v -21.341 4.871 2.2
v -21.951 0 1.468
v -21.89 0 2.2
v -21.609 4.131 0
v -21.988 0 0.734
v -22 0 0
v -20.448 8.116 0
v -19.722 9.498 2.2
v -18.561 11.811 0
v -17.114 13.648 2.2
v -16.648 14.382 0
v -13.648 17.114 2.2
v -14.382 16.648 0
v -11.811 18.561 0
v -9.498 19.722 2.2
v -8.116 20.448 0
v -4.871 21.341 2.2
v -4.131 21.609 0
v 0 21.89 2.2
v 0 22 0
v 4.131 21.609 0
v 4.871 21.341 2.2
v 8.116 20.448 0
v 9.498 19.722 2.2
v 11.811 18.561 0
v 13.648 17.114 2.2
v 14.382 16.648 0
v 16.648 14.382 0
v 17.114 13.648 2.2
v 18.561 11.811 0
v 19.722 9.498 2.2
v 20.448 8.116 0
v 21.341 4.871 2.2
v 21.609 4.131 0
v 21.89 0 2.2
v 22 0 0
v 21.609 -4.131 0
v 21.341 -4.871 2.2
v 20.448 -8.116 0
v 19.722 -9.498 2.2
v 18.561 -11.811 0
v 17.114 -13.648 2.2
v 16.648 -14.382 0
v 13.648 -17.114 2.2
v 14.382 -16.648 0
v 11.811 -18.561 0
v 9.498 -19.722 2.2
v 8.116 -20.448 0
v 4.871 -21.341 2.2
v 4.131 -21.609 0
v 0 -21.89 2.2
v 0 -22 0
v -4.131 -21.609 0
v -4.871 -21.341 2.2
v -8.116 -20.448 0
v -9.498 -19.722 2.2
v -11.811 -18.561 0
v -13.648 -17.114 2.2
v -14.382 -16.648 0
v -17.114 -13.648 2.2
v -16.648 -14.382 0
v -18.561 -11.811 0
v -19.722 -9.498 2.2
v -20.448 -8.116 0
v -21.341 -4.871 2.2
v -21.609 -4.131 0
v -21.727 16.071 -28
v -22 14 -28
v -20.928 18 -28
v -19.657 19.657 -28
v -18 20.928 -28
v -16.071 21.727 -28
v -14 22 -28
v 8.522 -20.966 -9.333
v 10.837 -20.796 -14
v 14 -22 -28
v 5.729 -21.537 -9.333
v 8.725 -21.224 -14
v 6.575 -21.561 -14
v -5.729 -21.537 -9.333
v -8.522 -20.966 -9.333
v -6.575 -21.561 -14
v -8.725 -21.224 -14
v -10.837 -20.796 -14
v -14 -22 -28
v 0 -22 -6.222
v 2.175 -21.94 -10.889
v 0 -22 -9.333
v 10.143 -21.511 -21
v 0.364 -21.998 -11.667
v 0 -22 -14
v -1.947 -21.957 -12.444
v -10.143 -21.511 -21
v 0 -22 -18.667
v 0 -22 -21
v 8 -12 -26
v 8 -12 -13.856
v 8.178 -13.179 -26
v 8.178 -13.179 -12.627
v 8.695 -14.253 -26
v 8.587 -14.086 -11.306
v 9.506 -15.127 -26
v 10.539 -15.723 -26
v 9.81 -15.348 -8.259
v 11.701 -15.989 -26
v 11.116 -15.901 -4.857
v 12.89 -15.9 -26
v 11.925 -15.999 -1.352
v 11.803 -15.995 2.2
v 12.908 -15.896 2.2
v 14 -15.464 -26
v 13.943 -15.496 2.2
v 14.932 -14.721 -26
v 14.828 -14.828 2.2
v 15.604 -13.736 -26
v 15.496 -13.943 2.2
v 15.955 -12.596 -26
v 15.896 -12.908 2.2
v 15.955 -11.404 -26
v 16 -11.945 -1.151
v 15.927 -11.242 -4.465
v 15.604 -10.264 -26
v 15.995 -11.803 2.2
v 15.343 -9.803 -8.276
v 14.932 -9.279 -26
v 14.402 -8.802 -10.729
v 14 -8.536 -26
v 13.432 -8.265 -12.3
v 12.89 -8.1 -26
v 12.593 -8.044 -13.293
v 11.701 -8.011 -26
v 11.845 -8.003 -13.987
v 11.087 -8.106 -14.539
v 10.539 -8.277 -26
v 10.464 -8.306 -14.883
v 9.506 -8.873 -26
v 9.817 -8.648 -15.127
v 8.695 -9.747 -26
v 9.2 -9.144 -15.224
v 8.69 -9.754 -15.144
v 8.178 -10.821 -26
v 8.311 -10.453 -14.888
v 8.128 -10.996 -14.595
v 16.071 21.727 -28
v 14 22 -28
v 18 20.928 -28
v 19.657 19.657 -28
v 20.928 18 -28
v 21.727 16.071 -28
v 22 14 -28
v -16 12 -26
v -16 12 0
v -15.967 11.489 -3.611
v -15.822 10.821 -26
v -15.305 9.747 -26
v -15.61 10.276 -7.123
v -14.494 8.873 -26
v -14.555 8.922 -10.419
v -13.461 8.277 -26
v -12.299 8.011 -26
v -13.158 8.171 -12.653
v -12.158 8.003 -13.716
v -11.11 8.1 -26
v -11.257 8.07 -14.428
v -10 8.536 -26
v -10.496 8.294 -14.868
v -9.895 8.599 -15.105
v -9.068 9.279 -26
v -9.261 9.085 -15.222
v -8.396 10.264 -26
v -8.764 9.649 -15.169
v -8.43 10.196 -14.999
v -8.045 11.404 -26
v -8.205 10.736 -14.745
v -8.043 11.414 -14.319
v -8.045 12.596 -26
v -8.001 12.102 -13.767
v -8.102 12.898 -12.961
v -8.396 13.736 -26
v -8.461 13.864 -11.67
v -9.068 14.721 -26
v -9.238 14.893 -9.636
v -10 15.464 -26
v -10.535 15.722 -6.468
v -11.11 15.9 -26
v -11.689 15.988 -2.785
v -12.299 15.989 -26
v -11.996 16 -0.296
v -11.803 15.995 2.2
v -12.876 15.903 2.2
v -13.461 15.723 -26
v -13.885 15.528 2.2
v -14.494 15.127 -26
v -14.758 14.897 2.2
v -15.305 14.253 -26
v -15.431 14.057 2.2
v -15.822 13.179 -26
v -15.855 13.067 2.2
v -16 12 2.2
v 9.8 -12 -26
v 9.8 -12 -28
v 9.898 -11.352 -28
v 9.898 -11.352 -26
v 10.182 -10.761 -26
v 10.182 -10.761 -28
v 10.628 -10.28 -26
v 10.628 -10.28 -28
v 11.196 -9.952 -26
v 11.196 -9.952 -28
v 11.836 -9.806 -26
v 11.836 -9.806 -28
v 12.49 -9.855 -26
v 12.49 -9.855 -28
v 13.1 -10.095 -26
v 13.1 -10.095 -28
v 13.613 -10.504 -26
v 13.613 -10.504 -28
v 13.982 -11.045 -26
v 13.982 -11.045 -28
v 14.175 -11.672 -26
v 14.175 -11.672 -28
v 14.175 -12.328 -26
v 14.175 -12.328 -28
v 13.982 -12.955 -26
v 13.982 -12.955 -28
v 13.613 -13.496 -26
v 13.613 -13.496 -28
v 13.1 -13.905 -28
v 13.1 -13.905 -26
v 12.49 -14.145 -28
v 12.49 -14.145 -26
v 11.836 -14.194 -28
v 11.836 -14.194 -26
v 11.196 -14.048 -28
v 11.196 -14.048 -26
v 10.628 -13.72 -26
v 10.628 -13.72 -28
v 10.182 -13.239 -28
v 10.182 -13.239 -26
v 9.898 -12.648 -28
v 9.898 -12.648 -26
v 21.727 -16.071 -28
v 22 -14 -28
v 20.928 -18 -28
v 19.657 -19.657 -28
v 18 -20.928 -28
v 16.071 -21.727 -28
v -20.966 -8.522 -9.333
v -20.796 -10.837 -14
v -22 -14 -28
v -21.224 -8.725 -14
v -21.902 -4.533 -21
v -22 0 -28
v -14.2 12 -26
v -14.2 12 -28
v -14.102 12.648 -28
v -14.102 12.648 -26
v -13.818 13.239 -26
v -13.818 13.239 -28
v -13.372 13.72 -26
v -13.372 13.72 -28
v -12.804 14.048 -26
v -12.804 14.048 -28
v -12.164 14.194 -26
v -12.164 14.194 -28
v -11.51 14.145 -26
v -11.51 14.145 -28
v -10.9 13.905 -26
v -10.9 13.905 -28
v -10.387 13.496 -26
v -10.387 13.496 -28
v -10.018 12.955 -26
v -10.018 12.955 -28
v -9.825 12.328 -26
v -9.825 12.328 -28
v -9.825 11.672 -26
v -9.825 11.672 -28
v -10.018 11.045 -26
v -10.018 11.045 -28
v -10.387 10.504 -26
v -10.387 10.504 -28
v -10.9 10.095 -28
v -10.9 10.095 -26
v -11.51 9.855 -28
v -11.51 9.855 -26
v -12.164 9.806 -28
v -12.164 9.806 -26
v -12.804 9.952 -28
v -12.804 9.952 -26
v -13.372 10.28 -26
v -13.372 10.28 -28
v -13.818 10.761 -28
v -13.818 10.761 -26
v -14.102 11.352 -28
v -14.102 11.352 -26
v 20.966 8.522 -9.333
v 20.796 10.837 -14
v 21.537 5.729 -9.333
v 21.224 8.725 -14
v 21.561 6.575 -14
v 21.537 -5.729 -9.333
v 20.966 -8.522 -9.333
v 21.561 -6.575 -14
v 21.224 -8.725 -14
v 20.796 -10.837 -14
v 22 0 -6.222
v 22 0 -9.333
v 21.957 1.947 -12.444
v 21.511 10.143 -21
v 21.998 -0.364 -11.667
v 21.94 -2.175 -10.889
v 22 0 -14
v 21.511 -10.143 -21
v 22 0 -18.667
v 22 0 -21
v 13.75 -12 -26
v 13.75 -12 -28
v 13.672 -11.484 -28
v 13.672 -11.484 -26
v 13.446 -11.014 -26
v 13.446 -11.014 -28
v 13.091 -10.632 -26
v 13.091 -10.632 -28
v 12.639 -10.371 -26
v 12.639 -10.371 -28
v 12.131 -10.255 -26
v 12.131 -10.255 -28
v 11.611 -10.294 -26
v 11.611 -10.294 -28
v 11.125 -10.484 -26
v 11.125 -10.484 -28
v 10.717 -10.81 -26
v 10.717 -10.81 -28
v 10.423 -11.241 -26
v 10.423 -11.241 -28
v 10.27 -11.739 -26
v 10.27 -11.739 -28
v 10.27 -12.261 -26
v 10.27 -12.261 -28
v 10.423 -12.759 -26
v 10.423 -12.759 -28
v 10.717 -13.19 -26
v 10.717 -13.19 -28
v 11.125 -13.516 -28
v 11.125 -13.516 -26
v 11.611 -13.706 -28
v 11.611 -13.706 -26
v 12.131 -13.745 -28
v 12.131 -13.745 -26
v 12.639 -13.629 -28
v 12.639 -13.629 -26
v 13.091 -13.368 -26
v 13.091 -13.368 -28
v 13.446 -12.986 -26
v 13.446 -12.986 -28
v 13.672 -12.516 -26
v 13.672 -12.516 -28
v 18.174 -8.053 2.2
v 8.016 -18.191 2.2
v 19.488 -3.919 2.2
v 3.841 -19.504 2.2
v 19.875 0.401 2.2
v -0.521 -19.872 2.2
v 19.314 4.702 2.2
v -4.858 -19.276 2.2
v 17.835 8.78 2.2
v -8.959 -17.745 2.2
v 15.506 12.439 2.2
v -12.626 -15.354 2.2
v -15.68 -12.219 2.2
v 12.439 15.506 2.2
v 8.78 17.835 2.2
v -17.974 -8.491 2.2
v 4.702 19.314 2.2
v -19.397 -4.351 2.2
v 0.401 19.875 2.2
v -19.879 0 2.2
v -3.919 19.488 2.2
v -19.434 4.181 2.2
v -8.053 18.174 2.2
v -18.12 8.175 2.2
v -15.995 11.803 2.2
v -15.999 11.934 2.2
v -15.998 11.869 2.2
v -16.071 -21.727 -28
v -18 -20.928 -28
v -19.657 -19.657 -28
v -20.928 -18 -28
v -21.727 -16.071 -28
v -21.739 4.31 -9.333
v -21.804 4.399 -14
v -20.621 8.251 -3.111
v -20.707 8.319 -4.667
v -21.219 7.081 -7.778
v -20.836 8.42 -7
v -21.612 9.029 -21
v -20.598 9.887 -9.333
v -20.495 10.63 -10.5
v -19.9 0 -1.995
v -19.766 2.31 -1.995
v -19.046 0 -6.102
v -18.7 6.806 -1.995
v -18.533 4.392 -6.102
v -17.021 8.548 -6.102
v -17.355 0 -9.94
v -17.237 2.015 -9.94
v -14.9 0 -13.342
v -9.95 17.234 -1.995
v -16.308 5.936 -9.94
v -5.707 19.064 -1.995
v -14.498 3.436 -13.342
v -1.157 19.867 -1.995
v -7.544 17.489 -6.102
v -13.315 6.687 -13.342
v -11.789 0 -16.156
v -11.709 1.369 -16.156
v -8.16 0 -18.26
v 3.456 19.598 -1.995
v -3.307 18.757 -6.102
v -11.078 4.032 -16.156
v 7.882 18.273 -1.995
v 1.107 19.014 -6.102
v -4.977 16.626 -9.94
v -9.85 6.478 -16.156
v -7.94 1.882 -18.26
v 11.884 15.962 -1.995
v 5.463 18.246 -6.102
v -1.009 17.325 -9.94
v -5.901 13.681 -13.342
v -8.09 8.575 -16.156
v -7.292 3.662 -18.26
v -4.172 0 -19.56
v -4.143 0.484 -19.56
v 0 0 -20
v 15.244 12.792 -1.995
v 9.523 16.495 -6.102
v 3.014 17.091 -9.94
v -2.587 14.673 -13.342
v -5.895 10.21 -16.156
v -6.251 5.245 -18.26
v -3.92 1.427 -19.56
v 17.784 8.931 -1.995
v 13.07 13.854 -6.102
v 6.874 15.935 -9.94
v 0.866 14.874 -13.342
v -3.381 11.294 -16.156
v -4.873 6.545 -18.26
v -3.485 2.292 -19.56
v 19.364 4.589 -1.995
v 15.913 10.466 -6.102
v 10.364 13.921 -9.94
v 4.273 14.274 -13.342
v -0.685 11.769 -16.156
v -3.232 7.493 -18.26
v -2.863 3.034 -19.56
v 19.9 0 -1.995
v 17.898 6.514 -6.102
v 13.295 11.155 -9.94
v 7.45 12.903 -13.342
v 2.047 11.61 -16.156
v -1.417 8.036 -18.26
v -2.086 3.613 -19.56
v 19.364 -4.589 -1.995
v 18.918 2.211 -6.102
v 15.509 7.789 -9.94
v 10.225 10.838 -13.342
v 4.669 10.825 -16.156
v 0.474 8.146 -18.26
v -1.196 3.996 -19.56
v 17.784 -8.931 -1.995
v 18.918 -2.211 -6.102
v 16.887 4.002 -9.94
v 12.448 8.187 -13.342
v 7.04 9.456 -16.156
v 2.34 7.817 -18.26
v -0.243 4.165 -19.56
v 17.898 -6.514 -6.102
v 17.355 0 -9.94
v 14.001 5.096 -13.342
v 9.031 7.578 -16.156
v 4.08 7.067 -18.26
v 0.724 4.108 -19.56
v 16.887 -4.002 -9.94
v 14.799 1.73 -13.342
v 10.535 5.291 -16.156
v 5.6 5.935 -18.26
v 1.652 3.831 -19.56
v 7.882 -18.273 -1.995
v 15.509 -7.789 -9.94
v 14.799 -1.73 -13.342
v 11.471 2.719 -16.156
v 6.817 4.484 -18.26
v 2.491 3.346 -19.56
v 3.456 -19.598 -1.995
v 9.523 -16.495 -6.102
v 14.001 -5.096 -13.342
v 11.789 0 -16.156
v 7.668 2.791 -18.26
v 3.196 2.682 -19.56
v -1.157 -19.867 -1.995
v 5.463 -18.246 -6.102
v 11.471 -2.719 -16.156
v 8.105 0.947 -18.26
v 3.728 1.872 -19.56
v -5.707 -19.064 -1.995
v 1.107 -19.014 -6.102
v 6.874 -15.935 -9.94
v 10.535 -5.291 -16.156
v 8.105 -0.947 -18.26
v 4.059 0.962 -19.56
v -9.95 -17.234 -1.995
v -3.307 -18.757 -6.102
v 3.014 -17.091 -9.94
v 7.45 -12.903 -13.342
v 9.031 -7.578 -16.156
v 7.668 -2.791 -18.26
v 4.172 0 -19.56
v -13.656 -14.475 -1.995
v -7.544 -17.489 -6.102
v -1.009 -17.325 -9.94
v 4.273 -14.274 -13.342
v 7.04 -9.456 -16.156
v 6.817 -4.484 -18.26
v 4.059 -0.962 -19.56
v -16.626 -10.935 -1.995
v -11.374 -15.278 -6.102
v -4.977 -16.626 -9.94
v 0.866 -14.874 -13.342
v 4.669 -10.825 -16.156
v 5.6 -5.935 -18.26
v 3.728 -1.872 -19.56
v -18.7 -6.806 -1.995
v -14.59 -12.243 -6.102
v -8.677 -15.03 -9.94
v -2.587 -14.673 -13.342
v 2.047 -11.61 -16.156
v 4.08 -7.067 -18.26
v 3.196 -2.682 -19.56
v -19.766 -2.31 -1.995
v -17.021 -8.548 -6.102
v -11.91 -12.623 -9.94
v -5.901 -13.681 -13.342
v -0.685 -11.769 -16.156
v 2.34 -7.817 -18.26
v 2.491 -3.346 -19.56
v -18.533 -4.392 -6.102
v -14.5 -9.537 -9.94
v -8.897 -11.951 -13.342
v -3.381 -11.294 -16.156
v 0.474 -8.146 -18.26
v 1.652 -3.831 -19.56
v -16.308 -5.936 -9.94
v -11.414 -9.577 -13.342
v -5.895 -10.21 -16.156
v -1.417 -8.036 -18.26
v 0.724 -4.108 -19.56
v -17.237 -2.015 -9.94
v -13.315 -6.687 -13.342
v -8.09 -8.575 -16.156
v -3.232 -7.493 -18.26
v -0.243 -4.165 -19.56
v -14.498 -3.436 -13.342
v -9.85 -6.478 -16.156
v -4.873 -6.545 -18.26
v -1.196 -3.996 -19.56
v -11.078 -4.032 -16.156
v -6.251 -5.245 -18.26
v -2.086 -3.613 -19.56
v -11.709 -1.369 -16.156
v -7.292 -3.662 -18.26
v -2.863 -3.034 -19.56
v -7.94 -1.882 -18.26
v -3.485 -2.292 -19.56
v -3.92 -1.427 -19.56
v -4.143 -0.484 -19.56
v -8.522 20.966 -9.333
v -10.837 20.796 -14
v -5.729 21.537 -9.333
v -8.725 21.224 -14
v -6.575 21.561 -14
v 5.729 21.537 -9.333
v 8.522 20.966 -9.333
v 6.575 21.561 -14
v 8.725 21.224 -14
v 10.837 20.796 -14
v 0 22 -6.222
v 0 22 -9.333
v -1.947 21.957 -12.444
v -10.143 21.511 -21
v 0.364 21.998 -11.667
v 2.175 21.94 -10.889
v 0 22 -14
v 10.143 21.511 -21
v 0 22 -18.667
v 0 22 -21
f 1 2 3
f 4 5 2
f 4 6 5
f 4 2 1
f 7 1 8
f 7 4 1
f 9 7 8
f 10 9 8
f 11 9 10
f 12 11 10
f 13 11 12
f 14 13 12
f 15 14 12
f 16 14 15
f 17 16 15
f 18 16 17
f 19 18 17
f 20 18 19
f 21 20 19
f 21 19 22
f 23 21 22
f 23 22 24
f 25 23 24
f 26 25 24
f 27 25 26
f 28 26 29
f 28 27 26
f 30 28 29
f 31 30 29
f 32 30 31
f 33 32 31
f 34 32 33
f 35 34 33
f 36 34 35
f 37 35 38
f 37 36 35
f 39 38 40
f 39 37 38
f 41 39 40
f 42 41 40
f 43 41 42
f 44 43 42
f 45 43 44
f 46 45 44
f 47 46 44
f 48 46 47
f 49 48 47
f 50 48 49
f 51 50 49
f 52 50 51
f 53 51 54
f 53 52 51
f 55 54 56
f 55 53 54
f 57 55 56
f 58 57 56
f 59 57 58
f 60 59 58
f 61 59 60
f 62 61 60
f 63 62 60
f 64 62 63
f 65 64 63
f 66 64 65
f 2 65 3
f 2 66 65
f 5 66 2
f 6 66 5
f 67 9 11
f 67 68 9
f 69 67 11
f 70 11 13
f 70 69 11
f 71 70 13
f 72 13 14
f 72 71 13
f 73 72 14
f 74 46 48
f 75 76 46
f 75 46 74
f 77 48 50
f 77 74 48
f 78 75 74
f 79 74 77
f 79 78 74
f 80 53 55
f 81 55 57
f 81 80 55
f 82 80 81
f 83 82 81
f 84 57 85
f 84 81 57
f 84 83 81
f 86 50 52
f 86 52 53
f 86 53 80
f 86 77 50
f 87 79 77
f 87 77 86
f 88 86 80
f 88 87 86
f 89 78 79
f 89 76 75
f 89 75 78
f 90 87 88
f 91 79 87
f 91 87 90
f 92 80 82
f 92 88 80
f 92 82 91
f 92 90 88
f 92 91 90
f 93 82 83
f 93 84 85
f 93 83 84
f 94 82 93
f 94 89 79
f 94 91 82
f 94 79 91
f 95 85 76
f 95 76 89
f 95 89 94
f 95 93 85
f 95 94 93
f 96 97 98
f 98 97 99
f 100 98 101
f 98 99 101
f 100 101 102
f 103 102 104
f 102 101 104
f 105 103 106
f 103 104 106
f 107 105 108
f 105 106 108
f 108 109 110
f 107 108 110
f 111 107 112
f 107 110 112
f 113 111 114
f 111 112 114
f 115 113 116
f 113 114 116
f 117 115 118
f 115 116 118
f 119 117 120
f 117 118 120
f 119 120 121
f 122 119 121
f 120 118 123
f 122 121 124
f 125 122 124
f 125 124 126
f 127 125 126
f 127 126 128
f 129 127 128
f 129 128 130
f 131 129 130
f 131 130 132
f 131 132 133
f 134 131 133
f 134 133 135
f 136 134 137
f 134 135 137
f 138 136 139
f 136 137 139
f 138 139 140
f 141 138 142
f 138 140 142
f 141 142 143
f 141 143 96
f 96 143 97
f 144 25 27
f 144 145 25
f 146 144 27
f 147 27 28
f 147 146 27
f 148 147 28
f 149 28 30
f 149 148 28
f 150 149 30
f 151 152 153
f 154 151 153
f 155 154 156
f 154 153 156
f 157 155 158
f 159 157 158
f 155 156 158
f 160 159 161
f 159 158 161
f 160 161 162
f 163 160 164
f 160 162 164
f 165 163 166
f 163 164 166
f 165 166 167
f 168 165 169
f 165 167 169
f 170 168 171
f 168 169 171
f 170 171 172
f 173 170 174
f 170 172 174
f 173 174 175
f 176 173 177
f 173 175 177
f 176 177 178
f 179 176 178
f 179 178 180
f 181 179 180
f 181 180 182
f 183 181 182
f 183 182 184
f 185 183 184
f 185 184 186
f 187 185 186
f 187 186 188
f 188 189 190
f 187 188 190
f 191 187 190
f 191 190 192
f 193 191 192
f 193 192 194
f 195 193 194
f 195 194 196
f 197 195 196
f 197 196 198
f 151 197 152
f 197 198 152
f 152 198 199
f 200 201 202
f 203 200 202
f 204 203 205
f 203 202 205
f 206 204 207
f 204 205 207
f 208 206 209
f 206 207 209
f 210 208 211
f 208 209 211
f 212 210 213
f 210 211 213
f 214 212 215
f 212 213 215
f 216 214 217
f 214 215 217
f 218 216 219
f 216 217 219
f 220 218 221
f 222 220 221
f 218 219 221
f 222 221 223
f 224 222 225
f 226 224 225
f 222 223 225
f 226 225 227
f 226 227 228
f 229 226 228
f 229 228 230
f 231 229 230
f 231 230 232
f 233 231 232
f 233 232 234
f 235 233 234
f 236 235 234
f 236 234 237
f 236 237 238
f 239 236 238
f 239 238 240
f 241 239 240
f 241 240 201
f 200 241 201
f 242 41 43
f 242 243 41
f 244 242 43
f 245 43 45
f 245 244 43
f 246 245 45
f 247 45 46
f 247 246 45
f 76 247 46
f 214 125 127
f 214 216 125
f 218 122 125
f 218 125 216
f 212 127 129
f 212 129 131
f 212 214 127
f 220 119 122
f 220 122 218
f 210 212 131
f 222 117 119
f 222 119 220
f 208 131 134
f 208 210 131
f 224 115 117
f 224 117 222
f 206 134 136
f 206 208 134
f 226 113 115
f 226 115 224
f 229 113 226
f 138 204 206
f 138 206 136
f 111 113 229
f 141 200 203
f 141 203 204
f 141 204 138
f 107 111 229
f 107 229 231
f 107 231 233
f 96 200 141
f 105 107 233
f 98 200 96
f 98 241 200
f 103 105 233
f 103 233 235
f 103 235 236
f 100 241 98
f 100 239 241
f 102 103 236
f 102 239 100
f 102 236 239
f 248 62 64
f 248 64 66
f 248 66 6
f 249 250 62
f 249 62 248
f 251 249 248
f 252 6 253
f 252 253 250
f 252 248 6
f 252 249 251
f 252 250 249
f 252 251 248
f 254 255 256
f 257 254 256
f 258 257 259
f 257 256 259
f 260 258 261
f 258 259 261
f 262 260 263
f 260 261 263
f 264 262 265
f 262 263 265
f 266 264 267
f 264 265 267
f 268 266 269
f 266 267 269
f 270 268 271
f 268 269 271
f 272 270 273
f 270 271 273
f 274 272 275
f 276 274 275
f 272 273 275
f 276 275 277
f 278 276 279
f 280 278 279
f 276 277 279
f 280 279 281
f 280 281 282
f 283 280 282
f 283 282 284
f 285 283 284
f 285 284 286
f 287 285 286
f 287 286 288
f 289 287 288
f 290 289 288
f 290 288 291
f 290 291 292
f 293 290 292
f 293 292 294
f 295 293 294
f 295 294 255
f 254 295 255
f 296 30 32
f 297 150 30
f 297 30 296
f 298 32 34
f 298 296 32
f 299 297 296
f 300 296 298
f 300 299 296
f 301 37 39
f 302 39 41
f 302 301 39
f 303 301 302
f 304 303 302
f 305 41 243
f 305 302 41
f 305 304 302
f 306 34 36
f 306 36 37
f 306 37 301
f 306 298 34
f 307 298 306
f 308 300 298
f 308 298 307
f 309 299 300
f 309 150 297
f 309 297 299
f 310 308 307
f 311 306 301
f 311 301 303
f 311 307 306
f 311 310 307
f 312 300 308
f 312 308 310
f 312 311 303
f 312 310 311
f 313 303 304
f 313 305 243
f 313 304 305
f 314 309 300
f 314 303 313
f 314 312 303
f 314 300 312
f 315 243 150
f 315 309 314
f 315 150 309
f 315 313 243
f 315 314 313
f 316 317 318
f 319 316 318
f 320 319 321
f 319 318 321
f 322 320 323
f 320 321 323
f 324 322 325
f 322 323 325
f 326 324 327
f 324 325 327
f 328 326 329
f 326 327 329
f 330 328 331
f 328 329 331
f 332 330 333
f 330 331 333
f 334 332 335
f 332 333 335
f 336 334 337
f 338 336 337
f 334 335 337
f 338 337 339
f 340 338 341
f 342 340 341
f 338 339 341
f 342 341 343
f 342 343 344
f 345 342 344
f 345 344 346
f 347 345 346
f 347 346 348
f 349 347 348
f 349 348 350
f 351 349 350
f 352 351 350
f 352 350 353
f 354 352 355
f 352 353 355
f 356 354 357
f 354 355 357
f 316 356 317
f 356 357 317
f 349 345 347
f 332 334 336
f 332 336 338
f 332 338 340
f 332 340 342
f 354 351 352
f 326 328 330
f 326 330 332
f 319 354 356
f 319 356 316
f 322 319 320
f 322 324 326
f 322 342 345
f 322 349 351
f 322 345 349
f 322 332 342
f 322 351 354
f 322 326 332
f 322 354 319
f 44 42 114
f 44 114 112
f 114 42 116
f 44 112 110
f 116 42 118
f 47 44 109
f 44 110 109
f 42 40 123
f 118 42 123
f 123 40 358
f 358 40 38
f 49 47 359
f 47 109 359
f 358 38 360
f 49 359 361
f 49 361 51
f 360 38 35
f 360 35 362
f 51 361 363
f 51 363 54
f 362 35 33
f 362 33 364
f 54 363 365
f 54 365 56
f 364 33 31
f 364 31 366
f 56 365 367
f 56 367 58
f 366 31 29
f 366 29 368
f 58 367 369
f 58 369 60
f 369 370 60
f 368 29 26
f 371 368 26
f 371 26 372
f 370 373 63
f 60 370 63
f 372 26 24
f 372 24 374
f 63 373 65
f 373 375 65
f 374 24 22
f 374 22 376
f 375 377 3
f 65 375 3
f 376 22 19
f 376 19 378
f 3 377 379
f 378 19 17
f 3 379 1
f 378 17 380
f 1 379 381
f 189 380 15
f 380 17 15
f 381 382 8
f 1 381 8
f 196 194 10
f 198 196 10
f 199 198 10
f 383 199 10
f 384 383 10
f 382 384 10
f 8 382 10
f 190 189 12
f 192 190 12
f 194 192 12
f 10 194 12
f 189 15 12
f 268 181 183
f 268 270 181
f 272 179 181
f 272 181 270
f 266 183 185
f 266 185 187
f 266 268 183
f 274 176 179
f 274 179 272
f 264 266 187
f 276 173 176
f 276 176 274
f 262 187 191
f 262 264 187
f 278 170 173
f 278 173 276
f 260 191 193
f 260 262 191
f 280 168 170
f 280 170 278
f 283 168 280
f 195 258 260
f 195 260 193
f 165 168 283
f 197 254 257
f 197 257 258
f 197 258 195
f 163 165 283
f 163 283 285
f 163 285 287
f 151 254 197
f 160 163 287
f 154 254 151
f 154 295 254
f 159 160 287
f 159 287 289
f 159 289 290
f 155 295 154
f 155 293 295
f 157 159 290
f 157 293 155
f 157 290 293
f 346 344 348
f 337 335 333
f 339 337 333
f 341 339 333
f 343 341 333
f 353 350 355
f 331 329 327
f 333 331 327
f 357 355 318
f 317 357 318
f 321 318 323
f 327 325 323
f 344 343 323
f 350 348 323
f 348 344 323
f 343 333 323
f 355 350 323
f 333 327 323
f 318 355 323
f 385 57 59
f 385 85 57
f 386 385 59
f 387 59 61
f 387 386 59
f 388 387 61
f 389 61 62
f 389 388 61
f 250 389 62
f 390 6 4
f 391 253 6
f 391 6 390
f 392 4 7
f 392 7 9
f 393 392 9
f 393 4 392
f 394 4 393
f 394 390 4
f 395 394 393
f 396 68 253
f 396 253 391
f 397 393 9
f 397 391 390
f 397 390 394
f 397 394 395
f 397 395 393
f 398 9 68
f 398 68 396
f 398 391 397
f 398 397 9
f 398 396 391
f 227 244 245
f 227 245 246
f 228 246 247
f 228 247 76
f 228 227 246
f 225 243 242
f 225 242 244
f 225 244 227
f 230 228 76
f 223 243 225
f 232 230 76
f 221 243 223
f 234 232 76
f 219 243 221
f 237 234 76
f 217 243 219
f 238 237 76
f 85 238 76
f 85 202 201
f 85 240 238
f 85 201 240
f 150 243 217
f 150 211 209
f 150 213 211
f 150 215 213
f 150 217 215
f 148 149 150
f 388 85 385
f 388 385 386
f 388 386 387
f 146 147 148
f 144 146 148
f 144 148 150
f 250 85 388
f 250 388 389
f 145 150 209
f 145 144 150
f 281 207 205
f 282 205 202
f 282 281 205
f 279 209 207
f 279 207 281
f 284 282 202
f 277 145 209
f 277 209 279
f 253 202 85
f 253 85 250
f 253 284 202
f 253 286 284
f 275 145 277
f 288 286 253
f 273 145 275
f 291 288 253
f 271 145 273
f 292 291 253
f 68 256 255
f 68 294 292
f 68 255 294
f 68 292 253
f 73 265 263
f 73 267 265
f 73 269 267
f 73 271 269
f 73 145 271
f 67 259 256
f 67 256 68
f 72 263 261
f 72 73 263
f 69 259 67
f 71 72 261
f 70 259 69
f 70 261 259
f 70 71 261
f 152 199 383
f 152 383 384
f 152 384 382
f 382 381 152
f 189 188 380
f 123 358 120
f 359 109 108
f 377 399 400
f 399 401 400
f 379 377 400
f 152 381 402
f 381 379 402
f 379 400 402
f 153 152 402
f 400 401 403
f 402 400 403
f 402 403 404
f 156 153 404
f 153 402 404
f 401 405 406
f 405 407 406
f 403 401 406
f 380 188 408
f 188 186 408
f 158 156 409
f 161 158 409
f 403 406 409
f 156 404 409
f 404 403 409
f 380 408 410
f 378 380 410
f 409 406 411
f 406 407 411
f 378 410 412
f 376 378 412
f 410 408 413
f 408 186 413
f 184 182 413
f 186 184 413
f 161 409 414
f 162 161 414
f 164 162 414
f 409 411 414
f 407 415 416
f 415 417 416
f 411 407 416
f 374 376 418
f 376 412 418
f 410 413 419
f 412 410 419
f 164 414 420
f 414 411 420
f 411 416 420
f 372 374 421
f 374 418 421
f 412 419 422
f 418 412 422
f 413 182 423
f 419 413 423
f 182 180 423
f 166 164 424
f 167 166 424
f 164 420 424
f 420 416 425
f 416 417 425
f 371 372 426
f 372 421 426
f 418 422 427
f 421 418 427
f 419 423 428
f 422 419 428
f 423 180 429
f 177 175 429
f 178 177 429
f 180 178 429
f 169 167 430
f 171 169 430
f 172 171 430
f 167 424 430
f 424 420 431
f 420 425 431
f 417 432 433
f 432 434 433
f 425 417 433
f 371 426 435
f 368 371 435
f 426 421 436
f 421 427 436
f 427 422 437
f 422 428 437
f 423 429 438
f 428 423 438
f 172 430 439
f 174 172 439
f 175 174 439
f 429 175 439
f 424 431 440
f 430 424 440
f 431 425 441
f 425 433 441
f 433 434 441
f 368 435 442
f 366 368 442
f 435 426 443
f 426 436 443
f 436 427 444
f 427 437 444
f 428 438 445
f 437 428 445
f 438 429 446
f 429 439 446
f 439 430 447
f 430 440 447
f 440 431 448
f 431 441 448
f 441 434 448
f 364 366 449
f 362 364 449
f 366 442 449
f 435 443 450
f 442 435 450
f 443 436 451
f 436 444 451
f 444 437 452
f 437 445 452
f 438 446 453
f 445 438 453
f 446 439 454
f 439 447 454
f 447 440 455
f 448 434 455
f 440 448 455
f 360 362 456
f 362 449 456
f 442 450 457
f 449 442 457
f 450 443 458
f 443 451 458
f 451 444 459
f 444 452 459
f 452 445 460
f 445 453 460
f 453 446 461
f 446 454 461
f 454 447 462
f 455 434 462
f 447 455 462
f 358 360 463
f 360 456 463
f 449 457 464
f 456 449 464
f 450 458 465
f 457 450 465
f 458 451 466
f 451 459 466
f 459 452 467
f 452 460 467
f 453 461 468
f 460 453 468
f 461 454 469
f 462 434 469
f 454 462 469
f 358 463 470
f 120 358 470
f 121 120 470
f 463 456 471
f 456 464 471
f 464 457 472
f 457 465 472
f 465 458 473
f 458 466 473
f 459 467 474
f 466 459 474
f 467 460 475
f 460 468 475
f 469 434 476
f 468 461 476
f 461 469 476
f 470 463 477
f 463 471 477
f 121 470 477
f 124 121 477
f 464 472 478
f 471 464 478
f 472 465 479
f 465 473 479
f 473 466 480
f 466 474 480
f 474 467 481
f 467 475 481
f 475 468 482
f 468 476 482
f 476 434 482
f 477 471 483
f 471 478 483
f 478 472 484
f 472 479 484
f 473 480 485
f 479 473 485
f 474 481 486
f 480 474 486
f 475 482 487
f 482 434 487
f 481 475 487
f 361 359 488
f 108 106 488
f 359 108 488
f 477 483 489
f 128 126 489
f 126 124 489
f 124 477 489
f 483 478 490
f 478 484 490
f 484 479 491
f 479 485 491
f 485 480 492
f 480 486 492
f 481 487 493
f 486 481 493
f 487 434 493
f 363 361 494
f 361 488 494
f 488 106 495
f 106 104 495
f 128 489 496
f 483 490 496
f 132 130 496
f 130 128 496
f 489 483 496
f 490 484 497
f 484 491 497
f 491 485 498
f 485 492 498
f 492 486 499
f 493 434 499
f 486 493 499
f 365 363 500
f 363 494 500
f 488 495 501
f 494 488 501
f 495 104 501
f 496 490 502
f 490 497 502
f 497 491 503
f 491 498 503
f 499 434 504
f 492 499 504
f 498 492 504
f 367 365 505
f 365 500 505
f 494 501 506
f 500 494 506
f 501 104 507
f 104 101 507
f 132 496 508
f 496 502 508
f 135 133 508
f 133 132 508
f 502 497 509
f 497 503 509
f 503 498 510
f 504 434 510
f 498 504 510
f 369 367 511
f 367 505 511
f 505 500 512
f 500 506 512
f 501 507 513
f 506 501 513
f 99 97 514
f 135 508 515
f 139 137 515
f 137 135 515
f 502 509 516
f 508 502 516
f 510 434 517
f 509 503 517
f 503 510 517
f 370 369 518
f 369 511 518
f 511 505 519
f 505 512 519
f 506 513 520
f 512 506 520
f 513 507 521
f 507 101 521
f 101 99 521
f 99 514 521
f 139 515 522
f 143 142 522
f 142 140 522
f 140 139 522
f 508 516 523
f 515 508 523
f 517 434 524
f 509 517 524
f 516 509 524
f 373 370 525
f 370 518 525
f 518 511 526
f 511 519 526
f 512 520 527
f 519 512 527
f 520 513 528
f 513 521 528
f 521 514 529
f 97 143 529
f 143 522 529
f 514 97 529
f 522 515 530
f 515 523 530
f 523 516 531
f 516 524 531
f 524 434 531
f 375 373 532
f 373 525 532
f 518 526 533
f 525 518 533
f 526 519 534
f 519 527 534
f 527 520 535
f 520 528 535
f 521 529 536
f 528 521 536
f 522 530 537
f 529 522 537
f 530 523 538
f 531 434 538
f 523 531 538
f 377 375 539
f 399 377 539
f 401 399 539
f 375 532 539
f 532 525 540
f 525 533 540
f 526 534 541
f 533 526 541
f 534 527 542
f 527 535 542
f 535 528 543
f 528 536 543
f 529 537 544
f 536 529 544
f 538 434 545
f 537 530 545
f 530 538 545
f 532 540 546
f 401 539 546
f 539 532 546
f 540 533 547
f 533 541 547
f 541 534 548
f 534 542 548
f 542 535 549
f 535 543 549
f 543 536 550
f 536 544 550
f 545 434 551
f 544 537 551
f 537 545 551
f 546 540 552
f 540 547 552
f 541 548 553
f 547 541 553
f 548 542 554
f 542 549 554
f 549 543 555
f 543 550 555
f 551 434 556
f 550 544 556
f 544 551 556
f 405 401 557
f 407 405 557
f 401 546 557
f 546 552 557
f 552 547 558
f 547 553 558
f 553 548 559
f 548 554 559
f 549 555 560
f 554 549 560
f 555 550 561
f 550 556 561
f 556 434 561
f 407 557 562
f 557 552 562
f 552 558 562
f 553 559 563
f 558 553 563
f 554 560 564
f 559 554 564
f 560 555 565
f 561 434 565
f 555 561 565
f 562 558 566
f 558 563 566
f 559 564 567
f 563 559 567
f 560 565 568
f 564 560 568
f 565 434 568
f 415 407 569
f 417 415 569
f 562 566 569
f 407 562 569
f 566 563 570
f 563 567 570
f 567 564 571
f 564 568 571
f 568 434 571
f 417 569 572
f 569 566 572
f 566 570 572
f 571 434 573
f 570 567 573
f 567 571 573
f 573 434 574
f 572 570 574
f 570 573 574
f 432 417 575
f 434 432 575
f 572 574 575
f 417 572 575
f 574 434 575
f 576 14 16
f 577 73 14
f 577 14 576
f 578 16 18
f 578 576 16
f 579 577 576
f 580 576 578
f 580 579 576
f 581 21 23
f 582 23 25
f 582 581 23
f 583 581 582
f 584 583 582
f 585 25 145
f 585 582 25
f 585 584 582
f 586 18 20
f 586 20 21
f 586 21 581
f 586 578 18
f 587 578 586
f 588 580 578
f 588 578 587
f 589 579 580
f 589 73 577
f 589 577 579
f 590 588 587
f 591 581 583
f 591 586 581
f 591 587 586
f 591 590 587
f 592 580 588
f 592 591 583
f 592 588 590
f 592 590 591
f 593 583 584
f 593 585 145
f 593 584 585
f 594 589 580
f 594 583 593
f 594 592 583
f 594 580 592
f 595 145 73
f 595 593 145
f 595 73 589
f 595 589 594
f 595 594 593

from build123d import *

# Parameters (mm, degrees)
BOX_W                  = 44
BOX_H                  = 44
BOX_DEPTH              = 44
SKETCH_R               = 22
CUT001_PLACEMENT_ANGLE = 180
SKETCH002_R            = 2.2
POCKET_DEPTH           = 30.201
SKETCH003_R            = 4
POCKET001_DEPTH        = 28.2
SKETCH004_R            = 1.75
PAD_DEPTH              = 2


with BuildPart() as sphere001:
    # Sphere001 → Sphere001 (revolve)
    with BuildSketch(Plane.XZ):
        with BuildLine():
            ThreePointArc((0, -20), (20, 0), (0, 20))
            Line((0, 20), (0, -20))
        make_face()
    revolve(axis=Axis((0, 0, 0), (0, 0, 1)))


with BuildPart() as cube:
    # Box → Box (new body)
    with BuildSketch(Plane(origin=(-22, -22, -46.2), x_dir=(1, 0, 0), z_dir=(0, 0, 1))):
        with Locations((22, 22)):
            Rectangle(BOX_W, BOX_H)
    extrude(amount=BOX_DEPTH)


with BuildPart() as cut:
    # Sphere → Sphere (revolve)
    with BuildSketch(Plane.XZ):
        with BuildLine():
            ThreePointArc((0, -22), (22, 0), (0, 22))
            Line((0, 22), (0, -22))
        make_face()
    revolve(axis=Axis((0, 0, 0), (0, 0, 1)))

    # Cut: cut Cube
    add(cube.part, mode=Mode.SUBTRACT)


with BuildPart() as pocket001:
    # Sketch → Loft section 0
    with BuildSketch(Plane.XY):
        Circle(SKETCH_R)
    # Sketch001 → Loft section 1
    with BuildSketch(Plane.XY.offset(28)):
        with BuildLine():
            Line((-14, 22), (14, 22))
            ThreePointArc((22, 14), (19.656854, 19.656854), (14, 22))
            Line((22, 14), (22, -14))
            ThreePointArc((14, -22), (19.656854, -19.656854), (22, -14))
            Line((14, -22), (-14, -22))
            ThreePointArc((-22, -14), (-19.656854, -19.656854), (-14, -22))
            Line((-22, -14), (-22, 14))
            ThreePointArc((-14, 22), (-19.656854, 19.656854), (-22, 14))
        make_face()
    loft()

    # Fusion: union Cut
    add(cut.part)

    # Cut001: cut Sphere001
    add(sphere001.part, mode=Mode.SUBTRACT)


with BuildPart() as pocket001_1:
    # Cut001 placement: moved
    add(pocket001.part.rotate(Axis((0, 0, 0), (0, 1, 0)), CUT001_PLACEMENT_ANGLE))

    # Sketch002 → Pocket (cut, through all)
    with BuildSketch(Plane(origin=(0, 0, -28), x_dir=(-1, 0, 0), z_dir=(0, 0, -1))):
        with Locations((-12, -12)):
            Circle(SKETCH002_R)
        with Locations((12, 12)):
            Circle(SKETCH002_R)
    extrude(amount=-POCKET_DEPTH, mode=Mode.SUBTRACT)

    # Sketch003 → Pocket001 (cut)
    with BuildSketch(Plane(origin=(0, 0, 2.2), x_dir=(-1, 0, 0), z_dir=(0, 0, 1))):
        with Locations((-12, 12)):
            Circle(SKETCH003_R)
        with Locations((12, -12)):
            Circle(SKETCH003_R)
    extrude(amount=-POCKET001_DEPTH, mode=Mode.SUBTRACT)


with BuildPart() as pad:
    # Sketch004 → Pad (new body)
    with BuildSketch(Plane(origin=(12, -12, -28), x_dir=(1, 0, 0), z_dir=(0, 0, 1))):
        Circle(SKETCH004_R)
    extrude(amount=PAD_DEPTH)


solid = Compound([pocket001_1.part, pad.part])
